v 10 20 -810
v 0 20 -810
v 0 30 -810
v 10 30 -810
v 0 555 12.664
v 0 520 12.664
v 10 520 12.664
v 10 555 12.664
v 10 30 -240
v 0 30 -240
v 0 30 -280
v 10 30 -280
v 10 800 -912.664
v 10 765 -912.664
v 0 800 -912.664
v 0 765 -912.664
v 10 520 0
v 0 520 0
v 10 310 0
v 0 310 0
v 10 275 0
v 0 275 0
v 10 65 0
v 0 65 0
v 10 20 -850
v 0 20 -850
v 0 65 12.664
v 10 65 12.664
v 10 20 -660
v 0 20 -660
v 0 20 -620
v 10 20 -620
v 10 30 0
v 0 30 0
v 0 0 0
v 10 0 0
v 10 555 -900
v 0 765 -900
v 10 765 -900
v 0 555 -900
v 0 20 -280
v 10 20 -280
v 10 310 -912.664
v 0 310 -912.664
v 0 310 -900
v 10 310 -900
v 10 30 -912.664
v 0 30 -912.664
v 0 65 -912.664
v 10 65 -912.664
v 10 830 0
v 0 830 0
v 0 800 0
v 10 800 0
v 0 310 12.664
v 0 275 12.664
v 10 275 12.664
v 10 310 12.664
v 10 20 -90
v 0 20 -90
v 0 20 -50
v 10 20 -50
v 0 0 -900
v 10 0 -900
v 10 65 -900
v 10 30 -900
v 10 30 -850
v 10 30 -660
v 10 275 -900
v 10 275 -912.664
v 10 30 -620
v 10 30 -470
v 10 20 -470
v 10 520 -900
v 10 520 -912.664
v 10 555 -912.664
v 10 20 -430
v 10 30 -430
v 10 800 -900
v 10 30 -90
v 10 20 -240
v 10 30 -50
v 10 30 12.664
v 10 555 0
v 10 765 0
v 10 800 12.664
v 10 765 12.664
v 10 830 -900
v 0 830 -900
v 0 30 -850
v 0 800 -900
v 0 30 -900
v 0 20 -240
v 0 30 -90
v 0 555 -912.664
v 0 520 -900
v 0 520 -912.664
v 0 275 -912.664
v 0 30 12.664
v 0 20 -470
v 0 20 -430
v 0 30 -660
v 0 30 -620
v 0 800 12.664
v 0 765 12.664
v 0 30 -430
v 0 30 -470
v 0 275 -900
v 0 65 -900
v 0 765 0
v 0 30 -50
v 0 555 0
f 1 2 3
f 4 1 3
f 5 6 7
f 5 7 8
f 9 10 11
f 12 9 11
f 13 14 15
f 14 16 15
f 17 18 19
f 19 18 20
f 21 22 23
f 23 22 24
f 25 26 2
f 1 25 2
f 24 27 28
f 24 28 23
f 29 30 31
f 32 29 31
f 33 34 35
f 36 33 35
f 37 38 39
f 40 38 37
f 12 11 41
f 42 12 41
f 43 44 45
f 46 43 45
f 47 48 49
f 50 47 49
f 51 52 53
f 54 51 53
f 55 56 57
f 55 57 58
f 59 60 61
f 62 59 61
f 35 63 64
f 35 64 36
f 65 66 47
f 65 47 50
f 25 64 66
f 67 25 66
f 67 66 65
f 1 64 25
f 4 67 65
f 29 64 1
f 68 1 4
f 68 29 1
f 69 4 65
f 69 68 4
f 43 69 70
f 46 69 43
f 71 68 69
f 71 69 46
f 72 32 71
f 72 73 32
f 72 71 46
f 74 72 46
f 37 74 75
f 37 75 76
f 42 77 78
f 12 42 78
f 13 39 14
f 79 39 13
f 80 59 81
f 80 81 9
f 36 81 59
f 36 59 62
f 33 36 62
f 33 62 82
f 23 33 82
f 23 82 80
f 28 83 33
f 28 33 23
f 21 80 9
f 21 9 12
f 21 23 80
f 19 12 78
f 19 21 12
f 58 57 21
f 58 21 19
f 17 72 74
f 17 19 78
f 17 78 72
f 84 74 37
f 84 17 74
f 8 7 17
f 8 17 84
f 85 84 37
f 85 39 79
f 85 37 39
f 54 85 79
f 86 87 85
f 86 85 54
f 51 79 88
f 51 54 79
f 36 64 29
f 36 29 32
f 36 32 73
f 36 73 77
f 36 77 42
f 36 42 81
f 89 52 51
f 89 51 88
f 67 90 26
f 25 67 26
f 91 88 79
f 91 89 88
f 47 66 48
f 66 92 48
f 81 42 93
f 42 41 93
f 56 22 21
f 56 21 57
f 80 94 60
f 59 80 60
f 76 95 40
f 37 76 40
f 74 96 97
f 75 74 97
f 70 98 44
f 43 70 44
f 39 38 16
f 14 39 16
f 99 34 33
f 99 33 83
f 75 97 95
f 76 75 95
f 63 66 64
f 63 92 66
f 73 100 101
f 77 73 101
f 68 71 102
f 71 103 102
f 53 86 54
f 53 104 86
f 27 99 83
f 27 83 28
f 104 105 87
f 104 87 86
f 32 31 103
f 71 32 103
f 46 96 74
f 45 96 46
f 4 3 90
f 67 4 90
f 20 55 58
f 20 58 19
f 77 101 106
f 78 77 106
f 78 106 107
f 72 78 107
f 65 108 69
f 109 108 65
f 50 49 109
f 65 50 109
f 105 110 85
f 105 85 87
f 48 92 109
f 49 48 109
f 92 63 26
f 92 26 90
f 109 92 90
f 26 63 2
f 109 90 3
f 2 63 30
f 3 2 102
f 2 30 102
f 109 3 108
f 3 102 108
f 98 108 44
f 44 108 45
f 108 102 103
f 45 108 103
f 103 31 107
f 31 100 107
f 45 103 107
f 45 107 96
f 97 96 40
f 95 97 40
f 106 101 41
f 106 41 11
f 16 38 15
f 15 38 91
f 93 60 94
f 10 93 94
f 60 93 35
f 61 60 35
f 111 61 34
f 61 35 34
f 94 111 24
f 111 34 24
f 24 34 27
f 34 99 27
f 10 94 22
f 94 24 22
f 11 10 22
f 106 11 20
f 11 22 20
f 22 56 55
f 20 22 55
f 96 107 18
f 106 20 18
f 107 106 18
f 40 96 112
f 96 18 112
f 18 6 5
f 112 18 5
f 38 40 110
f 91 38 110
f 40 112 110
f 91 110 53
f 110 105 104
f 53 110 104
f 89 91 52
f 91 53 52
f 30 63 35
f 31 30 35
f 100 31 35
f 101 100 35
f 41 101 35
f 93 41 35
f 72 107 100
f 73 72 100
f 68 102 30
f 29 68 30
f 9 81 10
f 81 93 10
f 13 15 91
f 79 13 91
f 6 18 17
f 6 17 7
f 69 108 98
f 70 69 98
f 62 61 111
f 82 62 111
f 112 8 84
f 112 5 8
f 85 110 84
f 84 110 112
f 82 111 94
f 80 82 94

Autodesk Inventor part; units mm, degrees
ref_plane "YZ Plane" through (0, 0, 0) normal (1, 0, 0) x (0, 1, 0)
ref_plane "XZ Plane" through (0, 0, 0) normal (0, 1, 0) x (-1, 0, 0)
ref_plane "XY Plane" through (0, 0, 0) normal (0, 0, 1) x (1, 0, 0)
sketch "Sketch1" plane through (0, 0, 0) normal (1, 0, 0) x (0, 1, 0)
  line L0 (0, 0) -> (830, 0) construction
  line L1 (830, 0) -> (830, -900)
  line L2 (830, -900) -> (0, -900) construction
  line L3 (0, -900) -> (0, 0)
  line L4 (800, 0) -> (765, 0) construction
  line L5 (765, 0) -> (765, 12.6635)
  line L6 (765, 12.6635) -> (800, 12.6635)
  line L7 (800, 12.6635) -> (800, 0)
  line L8 (555, 0) -> (520, 0) construction
  line L9 (520, 0) -> (520, 12.6635)
  line L10 (520, 12.6635) -> (555, 12.6635)
  line L11 (555, 12.6635) -> (555, 0)
  line L12 (310, 0) -> (275, 0) construction
  line L13 (275, 0) -> (275, 12.6635)
  line L14 (275, 12.6635) -> (310, 12.6635)
  line L15 (310, 12.6635) -> (310, 0)
  line L16 (65, 0) -> (30, 0) construction
  line L17 (30, 0) -> (30, 12.6635)
  line L18 (30, 12.6635) -> (65, 12.6635)
  line L19 (65, 12.6635) -> (65, 0)
  line L20 (830, -450) -> (0, -450) construction
  line L21 (800, -900) -> (765, -900) construction
  line L22 (765, -900) -> (765, -912.6635)
  line L23 (765, -912.6635) -> (800, -912.6635)
  line L24 (800, -912.6635) -> (800, -900)
  line L25 (555, -900) -> (520, -900) construction
  line L26 (520, -900) -> (520, -912.6635)
  line L27 (520, -912.6635) -> (555, -912.6635)
  line L28 (555, -912.6635) -> (555, -900)
  line L29 (310, -900) -> (275, -900) construction
  line L30 (275, -900) -> (275, -912.6635)
  line L31 (275, -912.6635) -> (310, -912.6635)
  line L32 (310, -912.6635) -> (310, -900)
  line L33 (65, -900) -> (30, -900) construction
  line L34 (30, -900) -> (30, -912.6635)
  line L35 (30, -912.6635) -> (65, -912.6635)
  line L36 (65, -912.6635) -> (65, -900)
  line L37 (830, -900) -> (800, -900)
  line L38 (765, -900) -> (555, -900)
  line L39 (520, -900) -> (310, -900)
  line L40 (275, -900) -> (65, -900)
  line L41 (30, -900) -> (0, -900)
  line L42 (830, 0) -> (800, 0)
  line L43 (765, 0) -> (555, 0)
  line L44 (520, 0) -> (310, 0)
  line L45 (275, 0) -> (65, 0)
  line L46 (30, 0) -> (0, 0)
  line L47 (20, -50) -> (30, -50)
  line L48 (30, -50) -> (30, -90)
  line L49 (30, -90) -> (20, -90)
  line L50 (20, -90) -> (20, -50)
  line L51 (20, -240) -> (30, -240)
  line L52 (30, -240) -> (30, -280)
  line L53 (30, -280) -> (20, -280)
  line L54 (20, -280) -> (20, -240)
  line L55 (20, -430) -> (30, -430)
  line L56 (30, -430) -> (30, -470)
  line L57 (30, -470) -> (20, -470)
  line L58 (20, -470) -> (20, -430)
  line L59 (20, -620) -> (30, -620)
  line L60 (30, -620) -> (30, -660)
  line L61 (30, -660) -> (20, -660)
  line L62 (20, -660) -> (20, -620)
  line L63 (20, -810) -> (30, -810)
  line L64 (30, -810) -> (30, -850)
  line L65 (30, -850) -> (20, -850)
  line L66 (20, -850) -> (20, -810)
  dimension "d0" = 900
  dimension "d1" = 830
  dimension "d2" = 35
  dimension "d3" = 30
  dimension "d4" = 210
  dimension "d5" = 210
  dimension "d6" = 210
  dimension "d7" = 30
  dimension "d11" = 40
  dimension "d12" = 10
  dimension "d15" = 40
  dimension "d16" = 10
  dimension "d17" = 40
  dimension "d18" = 10
  dimension "d19" = 40
  dimension "d20" = 10
  dimension "d21" = 40
  dimension "d22" = 10
  dimension "d23" = 150
  dimension "d24" = 150
  dimension "d25" = 150
  dimension "d26" = 150
  dimension "d27" = 50
  dimension "d28" = 50
  dimension "d31" = 20
extrude "Extrusion3" add sketch "Sketch1" along normal blind 10
properties part number "Fundo" material "Wood (Oak)"
